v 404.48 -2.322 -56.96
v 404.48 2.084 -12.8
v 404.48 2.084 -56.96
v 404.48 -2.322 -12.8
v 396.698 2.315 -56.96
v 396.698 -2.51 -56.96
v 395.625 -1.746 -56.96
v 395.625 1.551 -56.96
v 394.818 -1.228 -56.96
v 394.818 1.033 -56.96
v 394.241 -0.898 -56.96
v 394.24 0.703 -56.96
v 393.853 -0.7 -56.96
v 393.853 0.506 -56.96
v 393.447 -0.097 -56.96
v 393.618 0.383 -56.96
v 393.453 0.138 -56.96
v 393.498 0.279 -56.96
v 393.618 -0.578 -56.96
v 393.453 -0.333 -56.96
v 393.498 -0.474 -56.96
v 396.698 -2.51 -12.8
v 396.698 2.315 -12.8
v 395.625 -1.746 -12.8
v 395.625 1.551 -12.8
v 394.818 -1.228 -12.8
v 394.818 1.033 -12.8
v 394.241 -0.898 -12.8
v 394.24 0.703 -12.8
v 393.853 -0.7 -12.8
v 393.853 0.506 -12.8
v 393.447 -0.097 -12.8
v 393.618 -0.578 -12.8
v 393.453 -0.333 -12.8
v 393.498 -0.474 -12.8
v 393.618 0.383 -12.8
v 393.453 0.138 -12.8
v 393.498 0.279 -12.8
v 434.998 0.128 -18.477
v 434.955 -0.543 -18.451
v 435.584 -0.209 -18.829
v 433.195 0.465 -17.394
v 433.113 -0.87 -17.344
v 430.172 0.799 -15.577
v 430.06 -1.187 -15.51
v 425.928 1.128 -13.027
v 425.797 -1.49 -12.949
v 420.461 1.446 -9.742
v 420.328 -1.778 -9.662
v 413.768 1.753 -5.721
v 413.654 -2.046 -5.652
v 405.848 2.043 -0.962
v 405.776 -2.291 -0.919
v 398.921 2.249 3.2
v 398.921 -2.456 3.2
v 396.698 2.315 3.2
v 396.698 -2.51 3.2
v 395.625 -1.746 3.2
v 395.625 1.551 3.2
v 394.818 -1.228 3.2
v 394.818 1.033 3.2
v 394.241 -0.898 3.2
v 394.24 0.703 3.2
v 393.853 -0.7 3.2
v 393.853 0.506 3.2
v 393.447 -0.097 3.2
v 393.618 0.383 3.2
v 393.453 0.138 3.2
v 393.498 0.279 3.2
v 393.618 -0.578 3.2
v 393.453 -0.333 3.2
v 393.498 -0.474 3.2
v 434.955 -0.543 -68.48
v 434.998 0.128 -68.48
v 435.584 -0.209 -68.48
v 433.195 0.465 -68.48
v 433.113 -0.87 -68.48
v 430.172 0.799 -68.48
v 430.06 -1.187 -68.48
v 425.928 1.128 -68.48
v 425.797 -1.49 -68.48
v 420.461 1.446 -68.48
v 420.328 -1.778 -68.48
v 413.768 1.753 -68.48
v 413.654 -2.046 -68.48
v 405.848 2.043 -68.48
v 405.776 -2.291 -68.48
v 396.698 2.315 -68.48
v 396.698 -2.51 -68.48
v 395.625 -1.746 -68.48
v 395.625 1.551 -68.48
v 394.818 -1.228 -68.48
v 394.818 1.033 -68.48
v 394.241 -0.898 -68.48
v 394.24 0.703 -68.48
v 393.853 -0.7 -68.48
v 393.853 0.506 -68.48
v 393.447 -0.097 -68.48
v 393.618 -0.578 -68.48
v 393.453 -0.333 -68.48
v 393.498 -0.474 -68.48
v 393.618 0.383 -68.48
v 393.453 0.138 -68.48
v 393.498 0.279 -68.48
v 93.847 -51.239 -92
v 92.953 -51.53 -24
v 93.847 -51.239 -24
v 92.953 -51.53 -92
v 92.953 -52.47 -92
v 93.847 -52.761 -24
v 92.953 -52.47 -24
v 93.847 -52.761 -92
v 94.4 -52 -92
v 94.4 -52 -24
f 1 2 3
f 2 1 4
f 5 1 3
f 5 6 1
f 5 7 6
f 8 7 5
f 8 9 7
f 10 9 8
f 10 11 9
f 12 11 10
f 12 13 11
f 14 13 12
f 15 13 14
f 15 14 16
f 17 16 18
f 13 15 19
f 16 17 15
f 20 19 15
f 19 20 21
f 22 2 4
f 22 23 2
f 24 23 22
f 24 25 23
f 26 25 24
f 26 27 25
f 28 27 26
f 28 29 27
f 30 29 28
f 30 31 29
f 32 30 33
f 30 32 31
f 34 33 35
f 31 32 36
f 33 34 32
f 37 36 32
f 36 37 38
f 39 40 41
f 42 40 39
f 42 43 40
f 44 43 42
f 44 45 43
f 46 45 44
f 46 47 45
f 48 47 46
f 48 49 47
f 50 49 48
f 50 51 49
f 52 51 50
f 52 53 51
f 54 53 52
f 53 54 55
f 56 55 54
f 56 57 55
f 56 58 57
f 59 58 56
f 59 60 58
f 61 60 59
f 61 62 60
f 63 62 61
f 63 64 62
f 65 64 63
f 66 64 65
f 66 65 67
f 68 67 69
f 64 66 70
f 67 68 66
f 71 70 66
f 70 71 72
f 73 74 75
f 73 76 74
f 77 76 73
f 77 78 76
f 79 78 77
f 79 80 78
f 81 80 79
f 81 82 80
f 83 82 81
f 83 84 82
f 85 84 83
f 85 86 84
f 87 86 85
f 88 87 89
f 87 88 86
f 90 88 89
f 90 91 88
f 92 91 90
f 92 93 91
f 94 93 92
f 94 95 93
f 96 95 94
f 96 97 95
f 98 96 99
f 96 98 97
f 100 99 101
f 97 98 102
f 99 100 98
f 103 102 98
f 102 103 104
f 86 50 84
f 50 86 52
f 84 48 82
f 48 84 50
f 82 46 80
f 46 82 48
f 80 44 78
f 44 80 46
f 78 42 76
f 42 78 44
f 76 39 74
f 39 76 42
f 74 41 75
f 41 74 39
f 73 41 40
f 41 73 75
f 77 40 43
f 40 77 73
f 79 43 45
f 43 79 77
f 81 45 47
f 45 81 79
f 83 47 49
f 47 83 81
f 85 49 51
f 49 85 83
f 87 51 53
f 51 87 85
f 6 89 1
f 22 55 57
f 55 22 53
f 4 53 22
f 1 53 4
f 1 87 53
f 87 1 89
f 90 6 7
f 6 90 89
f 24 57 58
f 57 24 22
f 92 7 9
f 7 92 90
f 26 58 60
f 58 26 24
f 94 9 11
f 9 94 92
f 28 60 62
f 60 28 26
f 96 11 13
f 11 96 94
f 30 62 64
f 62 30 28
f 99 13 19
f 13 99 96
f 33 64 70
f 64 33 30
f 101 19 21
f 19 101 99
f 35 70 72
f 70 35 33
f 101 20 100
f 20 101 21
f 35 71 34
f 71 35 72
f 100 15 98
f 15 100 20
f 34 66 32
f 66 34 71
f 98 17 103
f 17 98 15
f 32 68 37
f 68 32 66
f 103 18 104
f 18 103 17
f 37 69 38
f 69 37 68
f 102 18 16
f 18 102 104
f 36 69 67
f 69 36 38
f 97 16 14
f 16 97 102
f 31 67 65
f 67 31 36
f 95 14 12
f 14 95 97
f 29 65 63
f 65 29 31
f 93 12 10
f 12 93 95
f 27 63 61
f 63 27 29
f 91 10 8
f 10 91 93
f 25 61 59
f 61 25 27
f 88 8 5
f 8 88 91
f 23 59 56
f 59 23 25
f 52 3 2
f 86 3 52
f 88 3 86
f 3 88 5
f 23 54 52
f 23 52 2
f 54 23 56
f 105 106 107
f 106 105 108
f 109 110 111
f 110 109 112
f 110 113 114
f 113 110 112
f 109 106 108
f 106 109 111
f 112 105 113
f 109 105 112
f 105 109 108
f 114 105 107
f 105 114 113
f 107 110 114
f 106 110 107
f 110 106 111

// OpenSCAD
// file: tail.scad
module tail_up_front(){
  translate([0,0,2]){
    difference(){
      union(){
        scale(0.8) translate([500,-65.2,-13]){
          difference(){
            translate([0,-22,0]) scale([0.6,0.4,0.6])
              linear_extrude(file = "tail/front.dxf",height = 200, convexity = 10);
            union(){
              translate([110,60-5,-1])
              cube([36,70+5,20+15]);
              translate([110,60-5,101])
              cube([36,70+5,20]);
              translate([110,60-5,30+15])
              cube([16,70+5,60-15]);
            }
          }
        }
      }
      translate([400,-100,-7.5-300])cube(300);
    }
    translate([0,0,3])tail_upper_socket();
  }
}

module tail_front(){
difference(){
  union(){
    scale(0.8) translate([500,-65.2,-13]){
      difference(){
        translate([0,-22,0]) scale([0.6,0.4,0.6])
          linear_extrude(file = "tail/front.dxf",height = 200, convexity = 10);
        union(){
          translate([110,60-5,-1])
          cube([36,70+5,20+15]);
          translate([110,60-5,101])
          cube([36,70+5,20]);
          translate([110,60-5,30+15])
          cube([16,70+5,60-15]);
        }
      }
    }
  }
  translate([400,-100,-7.501])cube(300);
}

}

module tail_back(){
  scale(0.8) translate([500,-65.2,-13]) {
  difference(){
  scale([0.6,0.3,0.6])
  scale([0.6,1,1])
  translate([120,0,0])
  linear_extrude(file = "tail/back.dxf",height = 200, convexity = 10);
  union(){
    translate([110,60,18+15])
    cube([22,70,120-36-15]);
    translate([110,0,0]) rotate([0,45+14,0]) cube([100,297,300]);
    translate([110,0,-1-5+3]) cube([60,297,11]);
  }
  }
  }

}

module tail_rod(){
      translate([110, 0, -12])rotate([0,90,0])cylinder(r=3.7,h=370);
}

module tail_unstranlated(){
difference(){
union(){
  tail_front();
  tail_back();
}
    translate([120,65,-1])
cylinder(r=2,h=200);

}
}

module tail(){
  difference(){
    tail_unstranlated();
    tail_rod();
  }
}

module tail_socket(){
  difference(){
    translate([450,0,-10]) cube([70,20,5],center=true);
    union(){
      tail_rod();
      translate([450,-7,-100]) cylinder(r=2,h=400);
      translate([475,-8,-100]) cylinder(r=2,h=400);
      translate([425,-6,-100]) cylinder(r=2,h=400);
      translate([450,7,-100]) cylinder(r=2,h=400);
      translate([475,8,-100]) cylinder(r=2,h=400);
      translate([425,6,-100]) cylinder(r=2,h=400);
    }
  }
}

module tail_upper_socket(){
  difference(){
    translate([450,0,-10]) cube([70,20,3],center=true);
    union(){
      translate([450,-7,-100]) cylinder(r=2,h=400);
     translate([475,-8,-100]) cylinder(r=2,h=400);
     translate([425,-6,-100]) cylinder(r=2,h=400);
     translate([450,7,-100]) cylinder(r=2,h=400);
     translate([475,8,-100]) cylinder(r=2,h=400);
     translate([425,6,-100]) cylinder(r=2,h=400);
    }
  }
}

module tail_socket_bottom(){
  back_wheel();
  difference(){
    translate([450,0,-19]) cube([70,20,3],center=true);
    union(){
      tail_rod();
      translate([450,-7,-100]) cylinder(r=2,h=400);
     translate([475,-8,-100]) cylinder(r=2,h=400);
     translate([425,-6,-100]) cylinder(r=2,h=400);
     translate([450,7,-100]) cylinder(r=2,h=400);
     translate([475,8,-100]) cylinder(r=2,h=400);
     translate([425,6,-100]) cylinder(r=2,h=400);
    }
  }
}

module back_wheel(){
difference(){
 translate([470,0,-28]) cube([20,6,20],center=true);
 translate([470-10,-6+12,-28-20]) rotate([0,45,0]) cube([40,40,40],center=true);
}
}

module elevator_fixed(){
difference(){
  union(){
    translate([500*0.8,48/0.7,-66]) rotate([90,0,0])
    scale([0.48,0.24,0.7]) linear_extrude(file = "tail/front.dxf",height = 200, convexity = 10);
  }
  union(){
    tail_rod();
      translate([450,-7,-100]) cylinder(r=2,h=400);
     translate([475,-8,-100]) cylinder(r=2,h=400);
     translate([425,-6,-100]) cylinder(r=2,h=400);
     translate([450,7,-100]) cylinder(r=2,h=400);
     translate([475,8,-100]) cylinder(r=2,h=400);
     translate([425,6,-100]) cylinder(r=2,h=400);
    translate([150,-200,-17-5/2]) cube([1000,1000,5]);
    translate([490,-60,-100]) cube([50,117,300]);
    translate([497,200,-12.5]) rotate([90,0,0]) cylinder(r=1,h=400);
  }
}
}

module elevator(){
  difference(){
    difference(){
      translate([500*0.8-3+35,48/0.7,-66]) rotate([90,0,0]) scale([0.3,0.24,0.7])
      linear_extrude(file = "tail/back.dxf",height = 200, convexity = 10);
      union(){
        translate([150,-200,-17-5/2]) cube([1000,1000,5]);
        translate([490,-90,-100]) cube([16,31,300]);
        translate([490,-60+117+1-2,-100]) cube([16,297,300]);
      }
  }
    translate([497,200,-12.5]) rotate([90,0,0]) cylinder(r=1,h=400);
  }
  
}

module tail_full(){
  tail();
  tail_up_front();
  tail_rod();
  tail_socket();
  tail_socket_bottom();
  elevator_fixed();
  elevator();
}


tail_full();
// main file
use <tail.scad>;
rotate([180,0,0]){
scale(0.8){
difference(){
  difference(){
     tail_back();
    tail_rod();
  }
  translate([120,65,-1])cylinder(r=2,h=200);

}

translate([117,65,30]) cylinder(r=1,h=85);

}
}
